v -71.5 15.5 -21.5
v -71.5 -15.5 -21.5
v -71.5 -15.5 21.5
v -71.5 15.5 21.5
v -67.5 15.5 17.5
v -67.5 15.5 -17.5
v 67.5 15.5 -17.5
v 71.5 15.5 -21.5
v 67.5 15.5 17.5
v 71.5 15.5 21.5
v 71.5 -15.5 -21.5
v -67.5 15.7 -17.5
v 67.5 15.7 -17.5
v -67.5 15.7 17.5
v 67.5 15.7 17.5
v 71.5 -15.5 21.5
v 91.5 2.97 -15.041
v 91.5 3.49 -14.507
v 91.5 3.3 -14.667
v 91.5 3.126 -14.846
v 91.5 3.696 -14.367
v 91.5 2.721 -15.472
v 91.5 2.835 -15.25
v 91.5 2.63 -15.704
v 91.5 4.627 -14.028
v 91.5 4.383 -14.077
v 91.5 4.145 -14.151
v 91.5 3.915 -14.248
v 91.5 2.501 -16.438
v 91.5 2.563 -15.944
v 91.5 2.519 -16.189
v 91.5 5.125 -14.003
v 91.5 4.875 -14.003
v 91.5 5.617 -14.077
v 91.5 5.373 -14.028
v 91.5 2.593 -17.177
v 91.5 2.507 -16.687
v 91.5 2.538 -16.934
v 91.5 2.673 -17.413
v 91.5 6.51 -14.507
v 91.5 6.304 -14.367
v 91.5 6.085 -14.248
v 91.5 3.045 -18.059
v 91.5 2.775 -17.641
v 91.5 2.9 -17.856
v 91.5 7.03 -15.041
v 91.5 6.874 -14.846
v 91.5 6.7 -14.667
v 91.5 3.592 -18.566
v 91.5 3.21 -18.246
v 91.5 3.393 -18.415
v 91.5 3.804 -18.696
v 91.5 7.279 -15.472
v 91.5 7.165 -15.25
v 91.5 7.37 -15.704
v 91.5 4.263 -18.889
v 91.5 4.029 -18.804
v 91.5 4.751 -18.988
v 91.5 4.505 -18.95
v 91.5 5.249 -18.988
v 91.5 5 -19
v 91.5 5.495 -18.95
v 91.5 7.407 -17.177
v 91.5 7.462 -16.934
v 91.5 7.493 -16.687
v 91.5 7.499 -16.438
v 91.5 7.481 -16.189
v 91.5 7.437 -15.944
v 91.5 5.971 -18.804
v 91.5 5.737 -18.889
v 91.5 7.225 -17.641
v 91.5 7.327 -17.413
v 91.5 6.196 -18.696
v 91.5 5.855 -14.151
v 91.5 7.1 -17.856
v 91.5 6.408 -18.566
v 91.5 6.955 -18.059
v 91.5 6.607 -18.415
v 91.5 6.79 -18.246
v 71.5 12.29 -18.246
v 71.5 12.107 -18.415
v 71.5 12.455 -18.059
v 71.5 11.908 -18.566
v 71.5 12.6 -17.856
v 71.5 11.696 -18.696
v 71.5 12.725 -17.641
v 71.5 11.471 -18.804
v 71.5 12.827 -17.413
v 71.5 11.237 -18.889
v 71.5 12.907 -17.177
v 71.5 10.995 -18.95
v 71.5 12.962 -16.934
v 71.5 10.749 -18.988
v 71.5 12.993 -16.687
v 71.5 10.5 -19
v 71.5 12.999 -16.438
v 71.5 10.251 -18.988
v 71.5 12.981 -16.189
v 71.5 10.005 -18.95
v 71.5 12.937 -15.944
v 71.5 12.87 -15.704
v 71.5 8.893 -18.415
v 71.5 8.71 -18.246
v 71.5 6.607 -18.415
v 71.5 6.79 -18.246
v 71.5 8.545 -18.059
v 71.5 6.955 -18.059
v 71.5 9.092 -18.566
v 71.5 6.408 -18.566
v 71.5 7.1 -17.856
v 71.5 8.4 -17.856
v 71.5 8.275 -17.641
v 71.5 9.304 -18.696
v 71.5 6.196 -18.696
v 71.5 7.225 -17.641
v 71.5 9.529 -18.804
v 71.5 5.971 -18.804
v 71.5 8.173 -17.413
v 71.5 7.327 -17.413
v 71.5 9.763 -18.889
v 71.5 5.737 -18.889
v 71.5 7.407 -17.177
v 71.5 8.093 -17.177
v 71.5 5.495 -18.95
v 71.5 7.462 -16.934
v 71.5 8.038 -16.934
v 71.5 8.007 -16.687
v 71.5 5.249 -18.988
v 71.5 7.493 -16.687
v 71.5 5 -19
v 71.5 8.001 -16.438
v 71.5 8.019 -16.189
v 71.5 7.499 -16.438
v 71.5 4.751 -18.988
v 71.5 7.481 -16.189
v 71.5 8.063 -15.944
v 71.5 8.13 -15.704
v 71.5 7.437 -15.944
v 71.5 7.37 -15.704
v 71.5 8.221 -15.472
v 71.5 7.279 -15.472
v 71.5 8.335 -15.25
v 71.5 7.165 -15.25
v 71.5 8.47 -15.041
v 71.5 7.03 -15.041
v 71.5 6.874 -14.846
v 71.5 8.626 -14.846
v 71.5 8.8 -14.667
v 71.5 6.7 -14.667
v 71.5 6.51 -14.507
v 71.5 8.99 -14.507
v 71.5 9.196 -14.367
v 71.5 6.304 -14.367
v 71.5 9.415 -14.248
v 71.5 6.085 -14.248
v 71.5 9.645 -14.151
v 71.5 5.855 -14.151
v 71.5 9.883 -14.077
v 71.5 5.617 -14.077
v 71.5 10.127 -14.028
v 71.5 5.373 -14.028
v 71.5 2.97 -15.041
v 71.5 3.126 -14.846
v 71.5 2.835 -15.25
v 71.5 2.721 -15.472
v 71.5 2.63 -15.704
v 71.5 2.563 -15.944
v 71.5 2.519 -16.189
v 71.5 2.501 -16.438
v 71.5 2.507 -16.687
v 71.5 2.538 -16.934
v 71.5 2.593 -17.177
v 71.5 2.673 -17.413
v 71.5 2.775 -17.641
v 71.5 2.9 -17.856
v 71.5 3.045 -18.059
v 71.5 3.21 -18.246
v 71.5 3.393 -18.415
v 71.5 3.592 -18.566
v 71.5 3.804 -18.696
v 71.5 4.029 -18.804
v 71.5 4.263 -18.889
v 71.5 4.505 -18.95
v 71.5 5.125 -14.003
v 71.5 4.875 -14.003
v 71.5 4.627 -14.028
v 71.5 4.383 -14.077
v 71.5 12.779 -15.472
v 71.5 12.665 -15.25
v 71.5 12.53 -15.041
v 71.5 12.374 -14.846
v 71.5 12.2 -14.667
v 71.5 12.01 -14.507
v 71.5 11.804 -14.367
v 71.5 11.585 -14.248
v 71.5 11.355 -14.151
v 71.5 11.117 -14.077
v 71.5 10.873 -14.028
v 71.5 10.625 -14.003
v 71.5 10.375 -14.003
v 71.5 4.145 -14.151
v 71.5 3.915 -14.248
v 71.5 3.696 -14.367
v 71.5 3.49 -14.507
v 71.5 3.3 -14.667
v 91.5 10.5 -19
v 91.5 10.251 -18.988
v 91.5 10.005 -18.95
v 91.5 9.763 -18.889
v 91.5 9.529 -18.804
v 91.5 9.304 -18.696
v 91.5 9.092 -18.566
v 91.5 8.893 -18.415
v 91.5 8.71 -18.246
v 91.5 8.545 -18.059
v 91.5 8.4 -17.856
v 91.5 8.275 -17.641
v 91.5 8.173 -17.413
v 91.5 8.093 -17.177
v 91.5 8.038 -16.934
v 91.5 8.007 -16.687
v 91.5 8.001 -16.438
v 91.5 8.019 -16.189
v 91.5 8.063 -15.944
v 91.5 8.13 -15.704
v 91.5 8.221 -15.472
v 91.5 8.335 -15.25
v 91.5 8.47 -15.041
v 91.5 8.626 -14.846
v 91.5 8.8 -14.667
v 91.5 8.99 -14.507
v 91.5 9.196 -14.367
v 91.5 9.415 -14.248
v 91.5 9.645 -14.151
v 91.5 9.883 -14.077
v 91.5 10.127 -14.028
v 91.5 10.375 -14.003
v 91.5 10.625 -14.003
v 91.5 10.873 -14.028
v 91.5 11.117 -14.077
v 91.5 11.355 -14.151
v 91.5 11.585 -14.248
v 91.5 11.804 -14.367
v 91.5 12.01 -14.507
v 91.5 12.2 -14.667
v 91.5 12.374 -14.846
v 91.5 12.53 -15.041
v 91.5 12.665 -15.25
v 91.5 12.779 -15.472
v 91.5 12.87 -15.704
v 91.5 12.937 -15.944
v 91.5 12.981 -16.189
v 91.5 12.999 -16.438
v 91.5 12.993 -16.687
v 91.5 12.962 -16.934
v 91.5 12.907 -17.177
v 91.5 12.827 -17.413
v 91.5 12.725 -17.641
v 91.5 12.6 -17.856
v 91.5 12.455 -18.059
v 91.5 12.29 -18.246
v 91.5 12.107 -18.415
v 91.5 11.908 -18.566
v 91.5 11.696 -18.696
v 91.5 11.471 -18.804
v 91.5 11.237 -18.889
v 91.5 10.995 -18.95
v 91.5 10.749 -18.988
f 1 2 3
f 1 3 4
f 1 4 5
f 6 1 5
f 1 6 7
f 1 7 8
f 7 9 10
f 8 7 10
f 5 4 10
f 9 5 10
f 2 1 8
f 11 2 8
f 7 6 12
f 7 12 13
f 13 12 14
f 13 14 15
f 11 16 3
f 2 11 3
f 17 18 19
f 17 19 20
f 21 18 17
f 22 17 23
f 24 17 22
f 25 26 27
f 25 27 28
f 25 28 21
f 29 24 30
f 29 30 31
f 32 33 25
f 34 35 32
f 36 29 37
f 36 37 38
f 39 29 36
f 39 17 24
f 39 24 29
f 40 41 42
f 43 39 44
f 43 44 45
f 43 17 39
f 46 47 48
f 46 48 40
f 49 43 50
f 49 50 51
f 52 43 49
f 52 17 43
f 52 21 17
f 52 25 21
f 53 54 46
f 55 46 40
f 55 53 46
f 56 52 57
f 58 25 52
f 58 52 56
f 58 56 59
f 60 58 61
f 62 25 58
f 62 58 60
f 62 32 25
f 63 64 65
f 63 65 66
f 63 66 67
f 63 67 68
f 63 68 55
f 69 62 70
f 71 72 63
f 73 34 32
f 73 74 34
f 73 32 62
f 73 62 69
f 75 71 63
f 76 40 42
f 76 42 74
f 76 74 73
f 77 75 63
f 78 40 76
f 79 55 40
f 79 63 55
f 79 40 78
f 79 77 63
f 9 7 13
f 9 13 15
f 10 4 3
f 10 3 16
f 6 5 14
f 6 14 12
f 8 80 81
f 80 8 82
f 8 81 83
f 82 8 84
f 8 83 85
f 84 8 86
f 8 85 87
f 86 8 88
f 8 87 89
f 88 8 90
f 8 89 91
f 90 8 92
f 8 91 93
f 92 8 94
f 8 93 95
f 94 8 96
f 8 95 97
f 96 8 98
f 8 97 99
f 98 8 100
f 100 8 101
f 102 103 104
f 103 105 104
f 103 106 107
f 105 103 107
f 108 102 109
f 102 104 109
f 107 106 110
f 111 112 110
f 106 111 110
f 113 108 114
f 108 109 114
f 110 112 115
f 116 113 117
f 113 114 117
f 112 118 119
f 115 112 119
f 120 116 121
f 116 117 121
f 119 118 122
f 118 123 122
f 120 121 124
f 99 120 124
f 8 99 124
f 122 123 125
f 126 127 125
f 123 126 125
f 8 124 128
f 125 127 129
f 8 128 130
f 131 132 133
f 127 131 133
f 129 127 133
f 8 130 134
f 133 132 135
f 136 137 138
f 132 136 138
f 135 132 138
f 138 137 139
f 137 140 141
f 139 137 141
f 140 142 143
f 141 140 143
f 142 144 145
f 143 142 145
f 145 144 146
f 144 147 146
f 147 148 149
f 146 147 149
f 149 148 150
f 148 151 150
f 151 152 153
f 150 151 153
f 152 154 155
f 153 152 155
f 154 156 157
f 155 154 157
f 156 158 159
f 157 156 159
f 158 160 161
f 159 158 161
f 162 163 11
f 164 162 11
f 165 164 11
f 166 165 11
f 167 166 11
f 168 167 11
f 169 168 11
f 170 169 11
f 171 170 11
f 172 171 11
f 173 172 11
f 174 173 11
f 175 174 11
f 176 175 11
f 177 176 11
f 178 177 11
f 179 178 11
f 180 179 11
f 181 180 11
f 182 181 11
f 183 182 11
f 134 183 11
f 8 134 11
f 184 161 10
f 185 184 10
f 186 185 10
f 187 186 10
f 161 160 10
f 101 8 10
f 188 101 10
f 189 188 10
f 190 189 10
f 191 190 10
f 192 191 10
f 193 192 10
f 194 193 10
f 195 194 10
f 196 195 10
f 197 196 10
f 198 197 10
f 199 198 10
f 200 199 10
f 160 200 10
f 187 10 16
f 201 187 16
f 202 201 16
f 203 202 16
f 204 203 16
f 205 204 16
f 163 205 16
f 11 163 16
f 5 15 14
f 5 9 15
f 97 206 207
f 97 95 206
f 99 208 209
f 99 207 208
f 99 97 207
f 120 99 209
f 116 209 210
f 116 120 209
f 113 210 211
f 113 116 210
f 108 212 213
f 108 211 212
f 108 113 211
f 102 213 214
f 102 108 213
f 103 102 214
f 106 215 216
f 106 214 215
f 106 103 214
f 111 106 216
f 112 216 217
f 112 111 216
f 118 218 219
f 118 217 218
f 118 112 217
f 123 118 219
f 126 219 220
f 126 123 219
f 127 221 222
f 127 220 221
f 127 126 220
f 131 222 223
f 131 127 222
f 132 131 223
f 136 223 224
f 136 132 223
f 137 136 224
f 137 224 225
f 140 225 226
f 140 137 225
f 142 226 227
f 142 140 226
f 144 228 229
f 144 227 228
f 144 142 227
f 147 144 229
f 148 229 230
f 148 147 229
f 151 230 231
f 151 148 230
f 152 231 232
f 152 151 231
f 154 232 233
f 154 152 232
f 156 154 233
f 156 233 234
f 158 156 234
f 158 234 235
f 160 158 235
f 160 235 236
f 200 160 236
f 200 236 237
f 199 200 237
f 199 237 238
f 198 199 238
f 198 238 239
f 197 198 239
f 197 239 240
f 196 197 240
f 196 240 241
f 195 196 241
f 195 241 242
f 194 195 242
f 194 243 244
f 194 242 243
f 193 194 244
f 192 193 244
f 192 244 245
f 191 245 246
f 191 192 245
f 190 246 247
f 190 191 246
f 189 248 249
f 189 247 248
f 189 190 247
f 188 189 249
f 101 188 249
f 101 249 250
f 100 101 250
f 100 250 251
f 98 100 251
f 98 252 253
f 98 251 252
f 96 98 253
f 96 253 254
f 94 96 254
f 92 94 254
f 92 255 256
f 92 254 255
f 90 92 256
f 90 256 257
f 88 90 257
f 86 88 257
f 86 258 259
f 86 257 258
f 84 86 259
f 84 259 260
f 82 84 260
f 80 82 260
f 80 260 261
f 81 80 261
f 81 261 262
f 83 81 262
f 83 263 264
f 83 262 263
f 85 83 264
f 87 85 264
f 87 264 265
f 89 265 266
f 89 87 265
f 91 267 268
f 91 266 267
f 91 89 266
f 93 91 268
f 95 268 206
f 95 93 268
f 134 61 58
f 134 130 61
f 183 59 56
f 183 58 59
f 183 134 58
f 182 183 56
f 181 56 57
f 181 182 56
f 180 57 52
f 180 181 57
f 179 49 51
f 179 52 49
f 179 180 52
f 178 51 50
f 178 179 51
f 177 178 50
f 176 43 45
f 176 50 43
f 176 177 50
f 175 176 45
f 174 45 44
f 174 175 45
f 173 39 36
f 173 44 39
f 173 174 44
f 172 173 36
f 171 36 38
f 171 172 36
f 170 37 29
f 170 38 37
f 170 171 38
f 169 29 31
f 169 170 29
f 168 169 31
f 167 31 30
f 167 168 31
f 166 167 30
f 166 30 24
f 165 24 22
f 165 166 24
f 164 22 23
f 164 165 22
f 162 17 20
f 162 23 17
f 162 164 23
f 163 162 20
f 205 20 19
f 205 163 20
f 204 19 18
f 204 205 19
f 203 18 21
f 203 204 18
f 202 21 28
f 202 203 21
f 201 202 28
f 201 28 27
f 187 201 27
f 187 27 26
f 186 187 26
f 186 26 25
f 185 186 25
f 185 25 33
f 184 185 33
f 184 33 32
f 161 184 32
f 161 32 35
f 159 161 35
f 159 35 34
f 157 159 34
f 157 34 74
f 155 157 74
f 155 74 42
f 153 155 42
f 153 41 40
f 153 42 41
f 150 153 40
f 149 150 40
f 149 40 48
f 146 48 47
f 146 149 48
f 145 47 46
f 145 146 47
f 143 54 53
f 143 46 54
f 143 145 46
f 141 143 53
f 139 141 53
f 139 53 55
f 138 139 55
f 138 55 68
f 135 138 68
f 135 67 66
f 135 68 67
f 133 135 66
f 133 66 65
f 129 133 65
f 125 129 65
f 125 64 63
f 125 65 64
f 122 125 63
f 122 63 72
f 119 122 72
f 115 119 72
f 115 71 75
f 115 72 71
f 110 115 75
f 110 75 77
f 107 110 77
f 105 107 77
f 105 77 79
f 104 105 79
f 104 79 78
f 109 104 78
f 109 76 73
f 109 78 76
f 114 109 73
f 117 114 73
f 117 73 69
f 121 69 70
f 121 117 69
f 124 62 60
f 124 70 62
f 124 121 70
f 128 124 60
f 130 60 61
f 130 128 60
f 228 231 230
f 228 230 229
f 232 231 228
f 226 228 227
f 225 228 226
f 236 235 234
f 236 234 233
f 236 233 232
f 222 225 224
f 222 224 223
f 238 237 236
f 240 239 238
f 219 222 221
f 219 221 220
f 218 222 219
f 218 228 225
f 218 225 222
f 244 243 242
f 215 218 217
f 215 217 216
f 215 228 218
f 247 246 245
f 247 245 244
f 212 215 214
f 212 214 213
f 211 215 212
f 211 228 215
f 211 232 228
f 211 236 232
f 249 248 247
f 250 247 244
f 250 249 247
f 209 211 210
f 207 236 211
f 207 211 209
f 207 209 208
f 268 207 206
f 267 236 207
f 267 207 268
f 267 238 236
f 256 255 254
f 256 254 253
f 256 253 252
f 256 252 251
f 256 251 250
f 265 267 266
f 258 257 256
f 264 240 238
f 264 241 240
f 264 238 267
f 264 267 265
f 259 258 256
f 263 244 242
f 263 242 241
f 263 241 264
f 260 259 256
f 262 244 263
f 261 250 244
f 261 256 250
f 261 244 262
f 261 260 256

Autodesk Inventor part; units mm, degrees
ref_plane "YZ Plane" through (0, 0, 0) normal (1, 0, 0) x (0, 1, 0)
ref_plane "XZ Plane" through (0, 0, 0) normal (0, 1, 0) x (-1, 0, 0)
ref_plane "XY Plane" through (0, 0, 0) normal (0, 0, 1) x (1, 0, 0)
sketch "Skizze1" plane through (0, 0, 0) normal (0, 0, 1) x (1, 0, 0)
  line L0 (-71.5, 15.5) -> (71.5, 15.5)
  line L1 (71.5, 15.5) -> (71.5, -15.5)
  line L2 (71.5, -15.5) -> (-71.5, -15.5)
  line L3 (-71.5, -15.5) -> (-71.5, 15.5)
  line L4 (0, -21.7) -> (0, 21.7) projected
  line L5 (-100.1, 0) -> (100.1, 0) projected
  point P0 (0, 0)
  dimension "d0" = 143
  dimension "d1" = 31
extrude "Extrusion1" add sketch "Skizze1" against normal mid plane 43
sketch "Skizze2" plane through (-71.5, 15.5, -21.5) normal (0, 1, 0) x (1, 0, 0)
  line L0 (4, -4) -> (139, -4)
  line L1 (139, -4) -> (139, -39)
  line L2 (139, -39) -> (4, -39)
  line L3 (4, -39) -> (4, -4)
  line L4 (143, -43) -> (0, -43) projected
  line L5 (0, 0) -> (143, 0) projected
  line L6 (0, 0) -> (0, -43) projected
  line L7 (143, 0) -> (143, -43) projected
  point P0 (71.5, -21.5)
  dimension "d5" = 4
  dimension "d6" = 4
  dimension "d7" = 4
  dimension "d8" = 4
extrude "Extrusion2" add sketch "Skizze2" along normal blind 0.2 contours L0 L1 L2 L3
sketch "Skizze3" plane through (71.5, -15.5, -21.5) normal (1, 0, 0) x (0, 0, -1)
  circle A0 centre (-5, 26) radius 2.5
  line L0 (0, 31) -> (-43, 31) projected
  line L1 (0, 31) -> (0, 0) projected
  circle A1 centre (-5, 20.5) radius 2.5
  point P0 (-21.5, 15.5)
  dimension "d11" = 5
  dimension "d12" = 5
  dimension "d13" = 5
  dimension "d14" = 5
  dimension "d15" = 5
  dimension "d16" = 5.5
extrude "Extrusion3" add sketch "Skizze3" along normal blind 20
properties part number "Akku"
